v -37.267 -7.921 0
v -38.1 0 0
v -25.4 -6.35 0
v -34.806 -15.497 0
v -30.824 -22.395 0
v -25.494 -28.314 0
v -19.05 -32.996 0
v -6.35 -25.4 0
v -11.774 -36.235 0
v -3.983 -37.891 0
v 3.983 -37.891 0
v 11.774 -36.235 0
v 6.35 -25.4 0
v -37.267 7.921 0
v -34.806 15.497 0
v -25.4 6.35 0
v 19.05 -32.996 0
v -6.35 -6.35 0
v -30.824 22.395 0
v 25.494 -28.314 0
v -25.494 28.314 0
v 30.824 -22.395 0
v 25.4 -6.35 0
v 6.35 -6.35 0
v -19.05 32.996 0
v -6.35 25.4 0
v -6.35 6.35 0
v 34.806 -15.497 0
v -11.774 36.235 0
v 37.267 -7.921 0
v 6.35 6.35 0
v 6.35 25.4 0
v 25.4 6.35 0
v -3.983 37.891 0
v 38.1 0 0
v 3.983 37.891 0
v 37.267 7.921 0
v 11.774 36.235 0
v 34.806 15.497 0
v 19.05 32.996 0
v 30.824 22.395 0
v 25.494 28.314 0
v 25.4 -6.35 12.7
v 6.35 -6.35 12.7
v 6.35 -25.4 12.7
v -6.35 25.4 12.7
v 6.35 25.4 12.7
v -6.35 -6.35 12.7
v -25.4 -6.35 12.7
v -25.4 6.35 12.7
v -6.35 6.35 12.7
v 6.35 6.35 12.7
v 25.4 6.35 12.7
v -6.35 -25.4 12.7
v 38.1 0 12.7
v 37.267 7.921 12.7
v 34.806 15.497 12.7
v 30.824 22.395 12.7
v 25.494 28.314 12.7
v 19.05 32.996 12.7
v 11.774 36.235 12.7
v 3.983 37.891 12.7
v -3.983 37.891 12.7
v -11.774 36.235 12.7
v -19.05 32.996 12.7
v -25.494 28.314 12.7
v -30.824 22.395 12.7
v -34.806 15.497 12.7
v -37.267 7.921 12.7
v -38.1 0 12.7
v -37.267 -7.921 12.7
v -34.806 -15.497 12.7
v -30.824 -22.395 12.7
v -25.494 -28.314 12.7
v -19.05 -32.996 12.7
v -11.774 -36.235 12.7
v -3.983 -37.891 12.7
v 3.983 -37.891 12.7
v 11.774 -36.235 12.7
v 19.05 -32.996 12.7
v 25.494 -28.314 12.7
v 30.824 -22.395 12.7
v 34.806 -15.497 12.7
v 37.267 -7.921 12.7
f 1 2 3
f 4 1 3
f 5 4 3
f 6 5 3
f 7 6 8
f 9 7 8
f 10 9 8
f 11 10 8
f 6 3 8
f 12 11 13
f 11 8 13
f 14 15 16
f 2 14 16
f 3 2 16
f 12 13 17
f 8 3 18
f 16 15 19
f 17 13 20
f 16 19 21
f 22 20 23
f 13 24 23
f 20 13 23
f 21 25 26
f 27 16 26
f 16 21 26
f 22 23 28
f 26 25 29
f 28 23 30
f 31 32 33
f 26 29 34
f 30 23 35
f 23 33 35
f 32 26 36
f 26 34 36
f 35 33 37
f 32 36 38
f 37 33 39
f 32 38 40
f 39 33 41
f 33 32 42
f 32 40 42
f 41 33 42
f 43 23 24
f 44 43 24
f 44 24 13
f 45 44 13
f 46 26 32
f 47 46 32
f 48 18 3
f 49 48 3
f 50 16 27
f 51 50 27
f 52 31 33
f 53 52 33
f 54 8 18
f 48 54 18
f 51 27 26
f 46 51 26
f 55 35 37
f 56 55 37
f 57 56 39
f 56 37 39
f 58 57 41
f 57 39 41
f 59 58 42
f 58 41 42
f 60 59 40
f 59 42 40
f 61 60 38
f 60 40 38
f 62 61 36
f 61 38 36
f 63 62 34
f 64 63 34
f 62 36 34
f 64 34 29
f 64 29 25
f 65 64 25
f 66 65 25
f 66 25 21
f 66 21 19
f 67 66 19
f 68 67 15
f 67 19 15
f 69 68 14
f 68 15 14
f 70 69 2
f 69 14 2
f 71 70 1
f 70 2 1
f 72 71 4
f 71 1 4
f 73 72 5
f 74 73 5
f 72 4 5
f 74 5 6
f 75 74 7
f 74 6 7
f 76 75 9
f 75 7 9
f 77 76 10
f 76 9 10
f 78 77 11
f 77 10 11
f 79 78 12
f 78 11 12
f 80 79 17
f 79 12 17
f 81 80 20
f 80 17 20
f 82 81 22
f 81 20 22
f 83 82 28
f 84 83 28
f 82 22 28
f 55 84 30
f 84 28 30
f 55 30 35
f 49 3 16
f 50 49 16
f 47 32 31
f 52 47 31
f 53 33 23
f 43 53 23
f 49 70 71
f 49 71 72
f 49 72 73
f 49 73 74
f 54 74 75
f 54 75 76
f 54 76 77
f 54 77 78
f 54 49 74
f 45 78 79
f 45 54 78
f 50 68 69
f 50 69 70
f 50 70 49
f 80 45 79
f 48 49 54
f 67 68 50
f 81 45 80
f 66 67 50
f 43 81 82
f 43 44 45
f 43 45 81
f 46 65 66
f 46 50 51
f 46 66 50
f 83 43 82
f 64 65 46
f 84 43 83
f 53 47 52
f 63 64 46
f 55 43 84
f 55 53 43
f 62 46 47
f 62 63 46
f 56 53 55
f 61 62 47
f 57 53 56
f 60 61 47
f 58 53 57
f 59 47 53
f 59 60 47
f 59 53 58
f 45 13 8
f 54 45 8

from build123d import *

# Parameters (mm, degrees)
F0_R     = 38.1
F1_DEPTH = 12.7


with BuildPart() as f1:
    # F0 (on Top) → F1 (new body)
    with BuildSketch(Plane.XY):
        Circle(F0_R)
        Polygon((6.35, 25.4), (6.35, 6.35), (25.4, 6.35), (25.4, -6.35), (6.35, -6.35), (6.35, -25.4), (-6.35, -25.4), (-6.35, -6.35), (-25.4, -6.35), (-25.4, 6.35), (-6.35, 6.35), (-6.35, 25.4), align=None, mode=Mode.SUBTRACT)
    extrude(amount=F1_DEPTH)


solid = f1.part
